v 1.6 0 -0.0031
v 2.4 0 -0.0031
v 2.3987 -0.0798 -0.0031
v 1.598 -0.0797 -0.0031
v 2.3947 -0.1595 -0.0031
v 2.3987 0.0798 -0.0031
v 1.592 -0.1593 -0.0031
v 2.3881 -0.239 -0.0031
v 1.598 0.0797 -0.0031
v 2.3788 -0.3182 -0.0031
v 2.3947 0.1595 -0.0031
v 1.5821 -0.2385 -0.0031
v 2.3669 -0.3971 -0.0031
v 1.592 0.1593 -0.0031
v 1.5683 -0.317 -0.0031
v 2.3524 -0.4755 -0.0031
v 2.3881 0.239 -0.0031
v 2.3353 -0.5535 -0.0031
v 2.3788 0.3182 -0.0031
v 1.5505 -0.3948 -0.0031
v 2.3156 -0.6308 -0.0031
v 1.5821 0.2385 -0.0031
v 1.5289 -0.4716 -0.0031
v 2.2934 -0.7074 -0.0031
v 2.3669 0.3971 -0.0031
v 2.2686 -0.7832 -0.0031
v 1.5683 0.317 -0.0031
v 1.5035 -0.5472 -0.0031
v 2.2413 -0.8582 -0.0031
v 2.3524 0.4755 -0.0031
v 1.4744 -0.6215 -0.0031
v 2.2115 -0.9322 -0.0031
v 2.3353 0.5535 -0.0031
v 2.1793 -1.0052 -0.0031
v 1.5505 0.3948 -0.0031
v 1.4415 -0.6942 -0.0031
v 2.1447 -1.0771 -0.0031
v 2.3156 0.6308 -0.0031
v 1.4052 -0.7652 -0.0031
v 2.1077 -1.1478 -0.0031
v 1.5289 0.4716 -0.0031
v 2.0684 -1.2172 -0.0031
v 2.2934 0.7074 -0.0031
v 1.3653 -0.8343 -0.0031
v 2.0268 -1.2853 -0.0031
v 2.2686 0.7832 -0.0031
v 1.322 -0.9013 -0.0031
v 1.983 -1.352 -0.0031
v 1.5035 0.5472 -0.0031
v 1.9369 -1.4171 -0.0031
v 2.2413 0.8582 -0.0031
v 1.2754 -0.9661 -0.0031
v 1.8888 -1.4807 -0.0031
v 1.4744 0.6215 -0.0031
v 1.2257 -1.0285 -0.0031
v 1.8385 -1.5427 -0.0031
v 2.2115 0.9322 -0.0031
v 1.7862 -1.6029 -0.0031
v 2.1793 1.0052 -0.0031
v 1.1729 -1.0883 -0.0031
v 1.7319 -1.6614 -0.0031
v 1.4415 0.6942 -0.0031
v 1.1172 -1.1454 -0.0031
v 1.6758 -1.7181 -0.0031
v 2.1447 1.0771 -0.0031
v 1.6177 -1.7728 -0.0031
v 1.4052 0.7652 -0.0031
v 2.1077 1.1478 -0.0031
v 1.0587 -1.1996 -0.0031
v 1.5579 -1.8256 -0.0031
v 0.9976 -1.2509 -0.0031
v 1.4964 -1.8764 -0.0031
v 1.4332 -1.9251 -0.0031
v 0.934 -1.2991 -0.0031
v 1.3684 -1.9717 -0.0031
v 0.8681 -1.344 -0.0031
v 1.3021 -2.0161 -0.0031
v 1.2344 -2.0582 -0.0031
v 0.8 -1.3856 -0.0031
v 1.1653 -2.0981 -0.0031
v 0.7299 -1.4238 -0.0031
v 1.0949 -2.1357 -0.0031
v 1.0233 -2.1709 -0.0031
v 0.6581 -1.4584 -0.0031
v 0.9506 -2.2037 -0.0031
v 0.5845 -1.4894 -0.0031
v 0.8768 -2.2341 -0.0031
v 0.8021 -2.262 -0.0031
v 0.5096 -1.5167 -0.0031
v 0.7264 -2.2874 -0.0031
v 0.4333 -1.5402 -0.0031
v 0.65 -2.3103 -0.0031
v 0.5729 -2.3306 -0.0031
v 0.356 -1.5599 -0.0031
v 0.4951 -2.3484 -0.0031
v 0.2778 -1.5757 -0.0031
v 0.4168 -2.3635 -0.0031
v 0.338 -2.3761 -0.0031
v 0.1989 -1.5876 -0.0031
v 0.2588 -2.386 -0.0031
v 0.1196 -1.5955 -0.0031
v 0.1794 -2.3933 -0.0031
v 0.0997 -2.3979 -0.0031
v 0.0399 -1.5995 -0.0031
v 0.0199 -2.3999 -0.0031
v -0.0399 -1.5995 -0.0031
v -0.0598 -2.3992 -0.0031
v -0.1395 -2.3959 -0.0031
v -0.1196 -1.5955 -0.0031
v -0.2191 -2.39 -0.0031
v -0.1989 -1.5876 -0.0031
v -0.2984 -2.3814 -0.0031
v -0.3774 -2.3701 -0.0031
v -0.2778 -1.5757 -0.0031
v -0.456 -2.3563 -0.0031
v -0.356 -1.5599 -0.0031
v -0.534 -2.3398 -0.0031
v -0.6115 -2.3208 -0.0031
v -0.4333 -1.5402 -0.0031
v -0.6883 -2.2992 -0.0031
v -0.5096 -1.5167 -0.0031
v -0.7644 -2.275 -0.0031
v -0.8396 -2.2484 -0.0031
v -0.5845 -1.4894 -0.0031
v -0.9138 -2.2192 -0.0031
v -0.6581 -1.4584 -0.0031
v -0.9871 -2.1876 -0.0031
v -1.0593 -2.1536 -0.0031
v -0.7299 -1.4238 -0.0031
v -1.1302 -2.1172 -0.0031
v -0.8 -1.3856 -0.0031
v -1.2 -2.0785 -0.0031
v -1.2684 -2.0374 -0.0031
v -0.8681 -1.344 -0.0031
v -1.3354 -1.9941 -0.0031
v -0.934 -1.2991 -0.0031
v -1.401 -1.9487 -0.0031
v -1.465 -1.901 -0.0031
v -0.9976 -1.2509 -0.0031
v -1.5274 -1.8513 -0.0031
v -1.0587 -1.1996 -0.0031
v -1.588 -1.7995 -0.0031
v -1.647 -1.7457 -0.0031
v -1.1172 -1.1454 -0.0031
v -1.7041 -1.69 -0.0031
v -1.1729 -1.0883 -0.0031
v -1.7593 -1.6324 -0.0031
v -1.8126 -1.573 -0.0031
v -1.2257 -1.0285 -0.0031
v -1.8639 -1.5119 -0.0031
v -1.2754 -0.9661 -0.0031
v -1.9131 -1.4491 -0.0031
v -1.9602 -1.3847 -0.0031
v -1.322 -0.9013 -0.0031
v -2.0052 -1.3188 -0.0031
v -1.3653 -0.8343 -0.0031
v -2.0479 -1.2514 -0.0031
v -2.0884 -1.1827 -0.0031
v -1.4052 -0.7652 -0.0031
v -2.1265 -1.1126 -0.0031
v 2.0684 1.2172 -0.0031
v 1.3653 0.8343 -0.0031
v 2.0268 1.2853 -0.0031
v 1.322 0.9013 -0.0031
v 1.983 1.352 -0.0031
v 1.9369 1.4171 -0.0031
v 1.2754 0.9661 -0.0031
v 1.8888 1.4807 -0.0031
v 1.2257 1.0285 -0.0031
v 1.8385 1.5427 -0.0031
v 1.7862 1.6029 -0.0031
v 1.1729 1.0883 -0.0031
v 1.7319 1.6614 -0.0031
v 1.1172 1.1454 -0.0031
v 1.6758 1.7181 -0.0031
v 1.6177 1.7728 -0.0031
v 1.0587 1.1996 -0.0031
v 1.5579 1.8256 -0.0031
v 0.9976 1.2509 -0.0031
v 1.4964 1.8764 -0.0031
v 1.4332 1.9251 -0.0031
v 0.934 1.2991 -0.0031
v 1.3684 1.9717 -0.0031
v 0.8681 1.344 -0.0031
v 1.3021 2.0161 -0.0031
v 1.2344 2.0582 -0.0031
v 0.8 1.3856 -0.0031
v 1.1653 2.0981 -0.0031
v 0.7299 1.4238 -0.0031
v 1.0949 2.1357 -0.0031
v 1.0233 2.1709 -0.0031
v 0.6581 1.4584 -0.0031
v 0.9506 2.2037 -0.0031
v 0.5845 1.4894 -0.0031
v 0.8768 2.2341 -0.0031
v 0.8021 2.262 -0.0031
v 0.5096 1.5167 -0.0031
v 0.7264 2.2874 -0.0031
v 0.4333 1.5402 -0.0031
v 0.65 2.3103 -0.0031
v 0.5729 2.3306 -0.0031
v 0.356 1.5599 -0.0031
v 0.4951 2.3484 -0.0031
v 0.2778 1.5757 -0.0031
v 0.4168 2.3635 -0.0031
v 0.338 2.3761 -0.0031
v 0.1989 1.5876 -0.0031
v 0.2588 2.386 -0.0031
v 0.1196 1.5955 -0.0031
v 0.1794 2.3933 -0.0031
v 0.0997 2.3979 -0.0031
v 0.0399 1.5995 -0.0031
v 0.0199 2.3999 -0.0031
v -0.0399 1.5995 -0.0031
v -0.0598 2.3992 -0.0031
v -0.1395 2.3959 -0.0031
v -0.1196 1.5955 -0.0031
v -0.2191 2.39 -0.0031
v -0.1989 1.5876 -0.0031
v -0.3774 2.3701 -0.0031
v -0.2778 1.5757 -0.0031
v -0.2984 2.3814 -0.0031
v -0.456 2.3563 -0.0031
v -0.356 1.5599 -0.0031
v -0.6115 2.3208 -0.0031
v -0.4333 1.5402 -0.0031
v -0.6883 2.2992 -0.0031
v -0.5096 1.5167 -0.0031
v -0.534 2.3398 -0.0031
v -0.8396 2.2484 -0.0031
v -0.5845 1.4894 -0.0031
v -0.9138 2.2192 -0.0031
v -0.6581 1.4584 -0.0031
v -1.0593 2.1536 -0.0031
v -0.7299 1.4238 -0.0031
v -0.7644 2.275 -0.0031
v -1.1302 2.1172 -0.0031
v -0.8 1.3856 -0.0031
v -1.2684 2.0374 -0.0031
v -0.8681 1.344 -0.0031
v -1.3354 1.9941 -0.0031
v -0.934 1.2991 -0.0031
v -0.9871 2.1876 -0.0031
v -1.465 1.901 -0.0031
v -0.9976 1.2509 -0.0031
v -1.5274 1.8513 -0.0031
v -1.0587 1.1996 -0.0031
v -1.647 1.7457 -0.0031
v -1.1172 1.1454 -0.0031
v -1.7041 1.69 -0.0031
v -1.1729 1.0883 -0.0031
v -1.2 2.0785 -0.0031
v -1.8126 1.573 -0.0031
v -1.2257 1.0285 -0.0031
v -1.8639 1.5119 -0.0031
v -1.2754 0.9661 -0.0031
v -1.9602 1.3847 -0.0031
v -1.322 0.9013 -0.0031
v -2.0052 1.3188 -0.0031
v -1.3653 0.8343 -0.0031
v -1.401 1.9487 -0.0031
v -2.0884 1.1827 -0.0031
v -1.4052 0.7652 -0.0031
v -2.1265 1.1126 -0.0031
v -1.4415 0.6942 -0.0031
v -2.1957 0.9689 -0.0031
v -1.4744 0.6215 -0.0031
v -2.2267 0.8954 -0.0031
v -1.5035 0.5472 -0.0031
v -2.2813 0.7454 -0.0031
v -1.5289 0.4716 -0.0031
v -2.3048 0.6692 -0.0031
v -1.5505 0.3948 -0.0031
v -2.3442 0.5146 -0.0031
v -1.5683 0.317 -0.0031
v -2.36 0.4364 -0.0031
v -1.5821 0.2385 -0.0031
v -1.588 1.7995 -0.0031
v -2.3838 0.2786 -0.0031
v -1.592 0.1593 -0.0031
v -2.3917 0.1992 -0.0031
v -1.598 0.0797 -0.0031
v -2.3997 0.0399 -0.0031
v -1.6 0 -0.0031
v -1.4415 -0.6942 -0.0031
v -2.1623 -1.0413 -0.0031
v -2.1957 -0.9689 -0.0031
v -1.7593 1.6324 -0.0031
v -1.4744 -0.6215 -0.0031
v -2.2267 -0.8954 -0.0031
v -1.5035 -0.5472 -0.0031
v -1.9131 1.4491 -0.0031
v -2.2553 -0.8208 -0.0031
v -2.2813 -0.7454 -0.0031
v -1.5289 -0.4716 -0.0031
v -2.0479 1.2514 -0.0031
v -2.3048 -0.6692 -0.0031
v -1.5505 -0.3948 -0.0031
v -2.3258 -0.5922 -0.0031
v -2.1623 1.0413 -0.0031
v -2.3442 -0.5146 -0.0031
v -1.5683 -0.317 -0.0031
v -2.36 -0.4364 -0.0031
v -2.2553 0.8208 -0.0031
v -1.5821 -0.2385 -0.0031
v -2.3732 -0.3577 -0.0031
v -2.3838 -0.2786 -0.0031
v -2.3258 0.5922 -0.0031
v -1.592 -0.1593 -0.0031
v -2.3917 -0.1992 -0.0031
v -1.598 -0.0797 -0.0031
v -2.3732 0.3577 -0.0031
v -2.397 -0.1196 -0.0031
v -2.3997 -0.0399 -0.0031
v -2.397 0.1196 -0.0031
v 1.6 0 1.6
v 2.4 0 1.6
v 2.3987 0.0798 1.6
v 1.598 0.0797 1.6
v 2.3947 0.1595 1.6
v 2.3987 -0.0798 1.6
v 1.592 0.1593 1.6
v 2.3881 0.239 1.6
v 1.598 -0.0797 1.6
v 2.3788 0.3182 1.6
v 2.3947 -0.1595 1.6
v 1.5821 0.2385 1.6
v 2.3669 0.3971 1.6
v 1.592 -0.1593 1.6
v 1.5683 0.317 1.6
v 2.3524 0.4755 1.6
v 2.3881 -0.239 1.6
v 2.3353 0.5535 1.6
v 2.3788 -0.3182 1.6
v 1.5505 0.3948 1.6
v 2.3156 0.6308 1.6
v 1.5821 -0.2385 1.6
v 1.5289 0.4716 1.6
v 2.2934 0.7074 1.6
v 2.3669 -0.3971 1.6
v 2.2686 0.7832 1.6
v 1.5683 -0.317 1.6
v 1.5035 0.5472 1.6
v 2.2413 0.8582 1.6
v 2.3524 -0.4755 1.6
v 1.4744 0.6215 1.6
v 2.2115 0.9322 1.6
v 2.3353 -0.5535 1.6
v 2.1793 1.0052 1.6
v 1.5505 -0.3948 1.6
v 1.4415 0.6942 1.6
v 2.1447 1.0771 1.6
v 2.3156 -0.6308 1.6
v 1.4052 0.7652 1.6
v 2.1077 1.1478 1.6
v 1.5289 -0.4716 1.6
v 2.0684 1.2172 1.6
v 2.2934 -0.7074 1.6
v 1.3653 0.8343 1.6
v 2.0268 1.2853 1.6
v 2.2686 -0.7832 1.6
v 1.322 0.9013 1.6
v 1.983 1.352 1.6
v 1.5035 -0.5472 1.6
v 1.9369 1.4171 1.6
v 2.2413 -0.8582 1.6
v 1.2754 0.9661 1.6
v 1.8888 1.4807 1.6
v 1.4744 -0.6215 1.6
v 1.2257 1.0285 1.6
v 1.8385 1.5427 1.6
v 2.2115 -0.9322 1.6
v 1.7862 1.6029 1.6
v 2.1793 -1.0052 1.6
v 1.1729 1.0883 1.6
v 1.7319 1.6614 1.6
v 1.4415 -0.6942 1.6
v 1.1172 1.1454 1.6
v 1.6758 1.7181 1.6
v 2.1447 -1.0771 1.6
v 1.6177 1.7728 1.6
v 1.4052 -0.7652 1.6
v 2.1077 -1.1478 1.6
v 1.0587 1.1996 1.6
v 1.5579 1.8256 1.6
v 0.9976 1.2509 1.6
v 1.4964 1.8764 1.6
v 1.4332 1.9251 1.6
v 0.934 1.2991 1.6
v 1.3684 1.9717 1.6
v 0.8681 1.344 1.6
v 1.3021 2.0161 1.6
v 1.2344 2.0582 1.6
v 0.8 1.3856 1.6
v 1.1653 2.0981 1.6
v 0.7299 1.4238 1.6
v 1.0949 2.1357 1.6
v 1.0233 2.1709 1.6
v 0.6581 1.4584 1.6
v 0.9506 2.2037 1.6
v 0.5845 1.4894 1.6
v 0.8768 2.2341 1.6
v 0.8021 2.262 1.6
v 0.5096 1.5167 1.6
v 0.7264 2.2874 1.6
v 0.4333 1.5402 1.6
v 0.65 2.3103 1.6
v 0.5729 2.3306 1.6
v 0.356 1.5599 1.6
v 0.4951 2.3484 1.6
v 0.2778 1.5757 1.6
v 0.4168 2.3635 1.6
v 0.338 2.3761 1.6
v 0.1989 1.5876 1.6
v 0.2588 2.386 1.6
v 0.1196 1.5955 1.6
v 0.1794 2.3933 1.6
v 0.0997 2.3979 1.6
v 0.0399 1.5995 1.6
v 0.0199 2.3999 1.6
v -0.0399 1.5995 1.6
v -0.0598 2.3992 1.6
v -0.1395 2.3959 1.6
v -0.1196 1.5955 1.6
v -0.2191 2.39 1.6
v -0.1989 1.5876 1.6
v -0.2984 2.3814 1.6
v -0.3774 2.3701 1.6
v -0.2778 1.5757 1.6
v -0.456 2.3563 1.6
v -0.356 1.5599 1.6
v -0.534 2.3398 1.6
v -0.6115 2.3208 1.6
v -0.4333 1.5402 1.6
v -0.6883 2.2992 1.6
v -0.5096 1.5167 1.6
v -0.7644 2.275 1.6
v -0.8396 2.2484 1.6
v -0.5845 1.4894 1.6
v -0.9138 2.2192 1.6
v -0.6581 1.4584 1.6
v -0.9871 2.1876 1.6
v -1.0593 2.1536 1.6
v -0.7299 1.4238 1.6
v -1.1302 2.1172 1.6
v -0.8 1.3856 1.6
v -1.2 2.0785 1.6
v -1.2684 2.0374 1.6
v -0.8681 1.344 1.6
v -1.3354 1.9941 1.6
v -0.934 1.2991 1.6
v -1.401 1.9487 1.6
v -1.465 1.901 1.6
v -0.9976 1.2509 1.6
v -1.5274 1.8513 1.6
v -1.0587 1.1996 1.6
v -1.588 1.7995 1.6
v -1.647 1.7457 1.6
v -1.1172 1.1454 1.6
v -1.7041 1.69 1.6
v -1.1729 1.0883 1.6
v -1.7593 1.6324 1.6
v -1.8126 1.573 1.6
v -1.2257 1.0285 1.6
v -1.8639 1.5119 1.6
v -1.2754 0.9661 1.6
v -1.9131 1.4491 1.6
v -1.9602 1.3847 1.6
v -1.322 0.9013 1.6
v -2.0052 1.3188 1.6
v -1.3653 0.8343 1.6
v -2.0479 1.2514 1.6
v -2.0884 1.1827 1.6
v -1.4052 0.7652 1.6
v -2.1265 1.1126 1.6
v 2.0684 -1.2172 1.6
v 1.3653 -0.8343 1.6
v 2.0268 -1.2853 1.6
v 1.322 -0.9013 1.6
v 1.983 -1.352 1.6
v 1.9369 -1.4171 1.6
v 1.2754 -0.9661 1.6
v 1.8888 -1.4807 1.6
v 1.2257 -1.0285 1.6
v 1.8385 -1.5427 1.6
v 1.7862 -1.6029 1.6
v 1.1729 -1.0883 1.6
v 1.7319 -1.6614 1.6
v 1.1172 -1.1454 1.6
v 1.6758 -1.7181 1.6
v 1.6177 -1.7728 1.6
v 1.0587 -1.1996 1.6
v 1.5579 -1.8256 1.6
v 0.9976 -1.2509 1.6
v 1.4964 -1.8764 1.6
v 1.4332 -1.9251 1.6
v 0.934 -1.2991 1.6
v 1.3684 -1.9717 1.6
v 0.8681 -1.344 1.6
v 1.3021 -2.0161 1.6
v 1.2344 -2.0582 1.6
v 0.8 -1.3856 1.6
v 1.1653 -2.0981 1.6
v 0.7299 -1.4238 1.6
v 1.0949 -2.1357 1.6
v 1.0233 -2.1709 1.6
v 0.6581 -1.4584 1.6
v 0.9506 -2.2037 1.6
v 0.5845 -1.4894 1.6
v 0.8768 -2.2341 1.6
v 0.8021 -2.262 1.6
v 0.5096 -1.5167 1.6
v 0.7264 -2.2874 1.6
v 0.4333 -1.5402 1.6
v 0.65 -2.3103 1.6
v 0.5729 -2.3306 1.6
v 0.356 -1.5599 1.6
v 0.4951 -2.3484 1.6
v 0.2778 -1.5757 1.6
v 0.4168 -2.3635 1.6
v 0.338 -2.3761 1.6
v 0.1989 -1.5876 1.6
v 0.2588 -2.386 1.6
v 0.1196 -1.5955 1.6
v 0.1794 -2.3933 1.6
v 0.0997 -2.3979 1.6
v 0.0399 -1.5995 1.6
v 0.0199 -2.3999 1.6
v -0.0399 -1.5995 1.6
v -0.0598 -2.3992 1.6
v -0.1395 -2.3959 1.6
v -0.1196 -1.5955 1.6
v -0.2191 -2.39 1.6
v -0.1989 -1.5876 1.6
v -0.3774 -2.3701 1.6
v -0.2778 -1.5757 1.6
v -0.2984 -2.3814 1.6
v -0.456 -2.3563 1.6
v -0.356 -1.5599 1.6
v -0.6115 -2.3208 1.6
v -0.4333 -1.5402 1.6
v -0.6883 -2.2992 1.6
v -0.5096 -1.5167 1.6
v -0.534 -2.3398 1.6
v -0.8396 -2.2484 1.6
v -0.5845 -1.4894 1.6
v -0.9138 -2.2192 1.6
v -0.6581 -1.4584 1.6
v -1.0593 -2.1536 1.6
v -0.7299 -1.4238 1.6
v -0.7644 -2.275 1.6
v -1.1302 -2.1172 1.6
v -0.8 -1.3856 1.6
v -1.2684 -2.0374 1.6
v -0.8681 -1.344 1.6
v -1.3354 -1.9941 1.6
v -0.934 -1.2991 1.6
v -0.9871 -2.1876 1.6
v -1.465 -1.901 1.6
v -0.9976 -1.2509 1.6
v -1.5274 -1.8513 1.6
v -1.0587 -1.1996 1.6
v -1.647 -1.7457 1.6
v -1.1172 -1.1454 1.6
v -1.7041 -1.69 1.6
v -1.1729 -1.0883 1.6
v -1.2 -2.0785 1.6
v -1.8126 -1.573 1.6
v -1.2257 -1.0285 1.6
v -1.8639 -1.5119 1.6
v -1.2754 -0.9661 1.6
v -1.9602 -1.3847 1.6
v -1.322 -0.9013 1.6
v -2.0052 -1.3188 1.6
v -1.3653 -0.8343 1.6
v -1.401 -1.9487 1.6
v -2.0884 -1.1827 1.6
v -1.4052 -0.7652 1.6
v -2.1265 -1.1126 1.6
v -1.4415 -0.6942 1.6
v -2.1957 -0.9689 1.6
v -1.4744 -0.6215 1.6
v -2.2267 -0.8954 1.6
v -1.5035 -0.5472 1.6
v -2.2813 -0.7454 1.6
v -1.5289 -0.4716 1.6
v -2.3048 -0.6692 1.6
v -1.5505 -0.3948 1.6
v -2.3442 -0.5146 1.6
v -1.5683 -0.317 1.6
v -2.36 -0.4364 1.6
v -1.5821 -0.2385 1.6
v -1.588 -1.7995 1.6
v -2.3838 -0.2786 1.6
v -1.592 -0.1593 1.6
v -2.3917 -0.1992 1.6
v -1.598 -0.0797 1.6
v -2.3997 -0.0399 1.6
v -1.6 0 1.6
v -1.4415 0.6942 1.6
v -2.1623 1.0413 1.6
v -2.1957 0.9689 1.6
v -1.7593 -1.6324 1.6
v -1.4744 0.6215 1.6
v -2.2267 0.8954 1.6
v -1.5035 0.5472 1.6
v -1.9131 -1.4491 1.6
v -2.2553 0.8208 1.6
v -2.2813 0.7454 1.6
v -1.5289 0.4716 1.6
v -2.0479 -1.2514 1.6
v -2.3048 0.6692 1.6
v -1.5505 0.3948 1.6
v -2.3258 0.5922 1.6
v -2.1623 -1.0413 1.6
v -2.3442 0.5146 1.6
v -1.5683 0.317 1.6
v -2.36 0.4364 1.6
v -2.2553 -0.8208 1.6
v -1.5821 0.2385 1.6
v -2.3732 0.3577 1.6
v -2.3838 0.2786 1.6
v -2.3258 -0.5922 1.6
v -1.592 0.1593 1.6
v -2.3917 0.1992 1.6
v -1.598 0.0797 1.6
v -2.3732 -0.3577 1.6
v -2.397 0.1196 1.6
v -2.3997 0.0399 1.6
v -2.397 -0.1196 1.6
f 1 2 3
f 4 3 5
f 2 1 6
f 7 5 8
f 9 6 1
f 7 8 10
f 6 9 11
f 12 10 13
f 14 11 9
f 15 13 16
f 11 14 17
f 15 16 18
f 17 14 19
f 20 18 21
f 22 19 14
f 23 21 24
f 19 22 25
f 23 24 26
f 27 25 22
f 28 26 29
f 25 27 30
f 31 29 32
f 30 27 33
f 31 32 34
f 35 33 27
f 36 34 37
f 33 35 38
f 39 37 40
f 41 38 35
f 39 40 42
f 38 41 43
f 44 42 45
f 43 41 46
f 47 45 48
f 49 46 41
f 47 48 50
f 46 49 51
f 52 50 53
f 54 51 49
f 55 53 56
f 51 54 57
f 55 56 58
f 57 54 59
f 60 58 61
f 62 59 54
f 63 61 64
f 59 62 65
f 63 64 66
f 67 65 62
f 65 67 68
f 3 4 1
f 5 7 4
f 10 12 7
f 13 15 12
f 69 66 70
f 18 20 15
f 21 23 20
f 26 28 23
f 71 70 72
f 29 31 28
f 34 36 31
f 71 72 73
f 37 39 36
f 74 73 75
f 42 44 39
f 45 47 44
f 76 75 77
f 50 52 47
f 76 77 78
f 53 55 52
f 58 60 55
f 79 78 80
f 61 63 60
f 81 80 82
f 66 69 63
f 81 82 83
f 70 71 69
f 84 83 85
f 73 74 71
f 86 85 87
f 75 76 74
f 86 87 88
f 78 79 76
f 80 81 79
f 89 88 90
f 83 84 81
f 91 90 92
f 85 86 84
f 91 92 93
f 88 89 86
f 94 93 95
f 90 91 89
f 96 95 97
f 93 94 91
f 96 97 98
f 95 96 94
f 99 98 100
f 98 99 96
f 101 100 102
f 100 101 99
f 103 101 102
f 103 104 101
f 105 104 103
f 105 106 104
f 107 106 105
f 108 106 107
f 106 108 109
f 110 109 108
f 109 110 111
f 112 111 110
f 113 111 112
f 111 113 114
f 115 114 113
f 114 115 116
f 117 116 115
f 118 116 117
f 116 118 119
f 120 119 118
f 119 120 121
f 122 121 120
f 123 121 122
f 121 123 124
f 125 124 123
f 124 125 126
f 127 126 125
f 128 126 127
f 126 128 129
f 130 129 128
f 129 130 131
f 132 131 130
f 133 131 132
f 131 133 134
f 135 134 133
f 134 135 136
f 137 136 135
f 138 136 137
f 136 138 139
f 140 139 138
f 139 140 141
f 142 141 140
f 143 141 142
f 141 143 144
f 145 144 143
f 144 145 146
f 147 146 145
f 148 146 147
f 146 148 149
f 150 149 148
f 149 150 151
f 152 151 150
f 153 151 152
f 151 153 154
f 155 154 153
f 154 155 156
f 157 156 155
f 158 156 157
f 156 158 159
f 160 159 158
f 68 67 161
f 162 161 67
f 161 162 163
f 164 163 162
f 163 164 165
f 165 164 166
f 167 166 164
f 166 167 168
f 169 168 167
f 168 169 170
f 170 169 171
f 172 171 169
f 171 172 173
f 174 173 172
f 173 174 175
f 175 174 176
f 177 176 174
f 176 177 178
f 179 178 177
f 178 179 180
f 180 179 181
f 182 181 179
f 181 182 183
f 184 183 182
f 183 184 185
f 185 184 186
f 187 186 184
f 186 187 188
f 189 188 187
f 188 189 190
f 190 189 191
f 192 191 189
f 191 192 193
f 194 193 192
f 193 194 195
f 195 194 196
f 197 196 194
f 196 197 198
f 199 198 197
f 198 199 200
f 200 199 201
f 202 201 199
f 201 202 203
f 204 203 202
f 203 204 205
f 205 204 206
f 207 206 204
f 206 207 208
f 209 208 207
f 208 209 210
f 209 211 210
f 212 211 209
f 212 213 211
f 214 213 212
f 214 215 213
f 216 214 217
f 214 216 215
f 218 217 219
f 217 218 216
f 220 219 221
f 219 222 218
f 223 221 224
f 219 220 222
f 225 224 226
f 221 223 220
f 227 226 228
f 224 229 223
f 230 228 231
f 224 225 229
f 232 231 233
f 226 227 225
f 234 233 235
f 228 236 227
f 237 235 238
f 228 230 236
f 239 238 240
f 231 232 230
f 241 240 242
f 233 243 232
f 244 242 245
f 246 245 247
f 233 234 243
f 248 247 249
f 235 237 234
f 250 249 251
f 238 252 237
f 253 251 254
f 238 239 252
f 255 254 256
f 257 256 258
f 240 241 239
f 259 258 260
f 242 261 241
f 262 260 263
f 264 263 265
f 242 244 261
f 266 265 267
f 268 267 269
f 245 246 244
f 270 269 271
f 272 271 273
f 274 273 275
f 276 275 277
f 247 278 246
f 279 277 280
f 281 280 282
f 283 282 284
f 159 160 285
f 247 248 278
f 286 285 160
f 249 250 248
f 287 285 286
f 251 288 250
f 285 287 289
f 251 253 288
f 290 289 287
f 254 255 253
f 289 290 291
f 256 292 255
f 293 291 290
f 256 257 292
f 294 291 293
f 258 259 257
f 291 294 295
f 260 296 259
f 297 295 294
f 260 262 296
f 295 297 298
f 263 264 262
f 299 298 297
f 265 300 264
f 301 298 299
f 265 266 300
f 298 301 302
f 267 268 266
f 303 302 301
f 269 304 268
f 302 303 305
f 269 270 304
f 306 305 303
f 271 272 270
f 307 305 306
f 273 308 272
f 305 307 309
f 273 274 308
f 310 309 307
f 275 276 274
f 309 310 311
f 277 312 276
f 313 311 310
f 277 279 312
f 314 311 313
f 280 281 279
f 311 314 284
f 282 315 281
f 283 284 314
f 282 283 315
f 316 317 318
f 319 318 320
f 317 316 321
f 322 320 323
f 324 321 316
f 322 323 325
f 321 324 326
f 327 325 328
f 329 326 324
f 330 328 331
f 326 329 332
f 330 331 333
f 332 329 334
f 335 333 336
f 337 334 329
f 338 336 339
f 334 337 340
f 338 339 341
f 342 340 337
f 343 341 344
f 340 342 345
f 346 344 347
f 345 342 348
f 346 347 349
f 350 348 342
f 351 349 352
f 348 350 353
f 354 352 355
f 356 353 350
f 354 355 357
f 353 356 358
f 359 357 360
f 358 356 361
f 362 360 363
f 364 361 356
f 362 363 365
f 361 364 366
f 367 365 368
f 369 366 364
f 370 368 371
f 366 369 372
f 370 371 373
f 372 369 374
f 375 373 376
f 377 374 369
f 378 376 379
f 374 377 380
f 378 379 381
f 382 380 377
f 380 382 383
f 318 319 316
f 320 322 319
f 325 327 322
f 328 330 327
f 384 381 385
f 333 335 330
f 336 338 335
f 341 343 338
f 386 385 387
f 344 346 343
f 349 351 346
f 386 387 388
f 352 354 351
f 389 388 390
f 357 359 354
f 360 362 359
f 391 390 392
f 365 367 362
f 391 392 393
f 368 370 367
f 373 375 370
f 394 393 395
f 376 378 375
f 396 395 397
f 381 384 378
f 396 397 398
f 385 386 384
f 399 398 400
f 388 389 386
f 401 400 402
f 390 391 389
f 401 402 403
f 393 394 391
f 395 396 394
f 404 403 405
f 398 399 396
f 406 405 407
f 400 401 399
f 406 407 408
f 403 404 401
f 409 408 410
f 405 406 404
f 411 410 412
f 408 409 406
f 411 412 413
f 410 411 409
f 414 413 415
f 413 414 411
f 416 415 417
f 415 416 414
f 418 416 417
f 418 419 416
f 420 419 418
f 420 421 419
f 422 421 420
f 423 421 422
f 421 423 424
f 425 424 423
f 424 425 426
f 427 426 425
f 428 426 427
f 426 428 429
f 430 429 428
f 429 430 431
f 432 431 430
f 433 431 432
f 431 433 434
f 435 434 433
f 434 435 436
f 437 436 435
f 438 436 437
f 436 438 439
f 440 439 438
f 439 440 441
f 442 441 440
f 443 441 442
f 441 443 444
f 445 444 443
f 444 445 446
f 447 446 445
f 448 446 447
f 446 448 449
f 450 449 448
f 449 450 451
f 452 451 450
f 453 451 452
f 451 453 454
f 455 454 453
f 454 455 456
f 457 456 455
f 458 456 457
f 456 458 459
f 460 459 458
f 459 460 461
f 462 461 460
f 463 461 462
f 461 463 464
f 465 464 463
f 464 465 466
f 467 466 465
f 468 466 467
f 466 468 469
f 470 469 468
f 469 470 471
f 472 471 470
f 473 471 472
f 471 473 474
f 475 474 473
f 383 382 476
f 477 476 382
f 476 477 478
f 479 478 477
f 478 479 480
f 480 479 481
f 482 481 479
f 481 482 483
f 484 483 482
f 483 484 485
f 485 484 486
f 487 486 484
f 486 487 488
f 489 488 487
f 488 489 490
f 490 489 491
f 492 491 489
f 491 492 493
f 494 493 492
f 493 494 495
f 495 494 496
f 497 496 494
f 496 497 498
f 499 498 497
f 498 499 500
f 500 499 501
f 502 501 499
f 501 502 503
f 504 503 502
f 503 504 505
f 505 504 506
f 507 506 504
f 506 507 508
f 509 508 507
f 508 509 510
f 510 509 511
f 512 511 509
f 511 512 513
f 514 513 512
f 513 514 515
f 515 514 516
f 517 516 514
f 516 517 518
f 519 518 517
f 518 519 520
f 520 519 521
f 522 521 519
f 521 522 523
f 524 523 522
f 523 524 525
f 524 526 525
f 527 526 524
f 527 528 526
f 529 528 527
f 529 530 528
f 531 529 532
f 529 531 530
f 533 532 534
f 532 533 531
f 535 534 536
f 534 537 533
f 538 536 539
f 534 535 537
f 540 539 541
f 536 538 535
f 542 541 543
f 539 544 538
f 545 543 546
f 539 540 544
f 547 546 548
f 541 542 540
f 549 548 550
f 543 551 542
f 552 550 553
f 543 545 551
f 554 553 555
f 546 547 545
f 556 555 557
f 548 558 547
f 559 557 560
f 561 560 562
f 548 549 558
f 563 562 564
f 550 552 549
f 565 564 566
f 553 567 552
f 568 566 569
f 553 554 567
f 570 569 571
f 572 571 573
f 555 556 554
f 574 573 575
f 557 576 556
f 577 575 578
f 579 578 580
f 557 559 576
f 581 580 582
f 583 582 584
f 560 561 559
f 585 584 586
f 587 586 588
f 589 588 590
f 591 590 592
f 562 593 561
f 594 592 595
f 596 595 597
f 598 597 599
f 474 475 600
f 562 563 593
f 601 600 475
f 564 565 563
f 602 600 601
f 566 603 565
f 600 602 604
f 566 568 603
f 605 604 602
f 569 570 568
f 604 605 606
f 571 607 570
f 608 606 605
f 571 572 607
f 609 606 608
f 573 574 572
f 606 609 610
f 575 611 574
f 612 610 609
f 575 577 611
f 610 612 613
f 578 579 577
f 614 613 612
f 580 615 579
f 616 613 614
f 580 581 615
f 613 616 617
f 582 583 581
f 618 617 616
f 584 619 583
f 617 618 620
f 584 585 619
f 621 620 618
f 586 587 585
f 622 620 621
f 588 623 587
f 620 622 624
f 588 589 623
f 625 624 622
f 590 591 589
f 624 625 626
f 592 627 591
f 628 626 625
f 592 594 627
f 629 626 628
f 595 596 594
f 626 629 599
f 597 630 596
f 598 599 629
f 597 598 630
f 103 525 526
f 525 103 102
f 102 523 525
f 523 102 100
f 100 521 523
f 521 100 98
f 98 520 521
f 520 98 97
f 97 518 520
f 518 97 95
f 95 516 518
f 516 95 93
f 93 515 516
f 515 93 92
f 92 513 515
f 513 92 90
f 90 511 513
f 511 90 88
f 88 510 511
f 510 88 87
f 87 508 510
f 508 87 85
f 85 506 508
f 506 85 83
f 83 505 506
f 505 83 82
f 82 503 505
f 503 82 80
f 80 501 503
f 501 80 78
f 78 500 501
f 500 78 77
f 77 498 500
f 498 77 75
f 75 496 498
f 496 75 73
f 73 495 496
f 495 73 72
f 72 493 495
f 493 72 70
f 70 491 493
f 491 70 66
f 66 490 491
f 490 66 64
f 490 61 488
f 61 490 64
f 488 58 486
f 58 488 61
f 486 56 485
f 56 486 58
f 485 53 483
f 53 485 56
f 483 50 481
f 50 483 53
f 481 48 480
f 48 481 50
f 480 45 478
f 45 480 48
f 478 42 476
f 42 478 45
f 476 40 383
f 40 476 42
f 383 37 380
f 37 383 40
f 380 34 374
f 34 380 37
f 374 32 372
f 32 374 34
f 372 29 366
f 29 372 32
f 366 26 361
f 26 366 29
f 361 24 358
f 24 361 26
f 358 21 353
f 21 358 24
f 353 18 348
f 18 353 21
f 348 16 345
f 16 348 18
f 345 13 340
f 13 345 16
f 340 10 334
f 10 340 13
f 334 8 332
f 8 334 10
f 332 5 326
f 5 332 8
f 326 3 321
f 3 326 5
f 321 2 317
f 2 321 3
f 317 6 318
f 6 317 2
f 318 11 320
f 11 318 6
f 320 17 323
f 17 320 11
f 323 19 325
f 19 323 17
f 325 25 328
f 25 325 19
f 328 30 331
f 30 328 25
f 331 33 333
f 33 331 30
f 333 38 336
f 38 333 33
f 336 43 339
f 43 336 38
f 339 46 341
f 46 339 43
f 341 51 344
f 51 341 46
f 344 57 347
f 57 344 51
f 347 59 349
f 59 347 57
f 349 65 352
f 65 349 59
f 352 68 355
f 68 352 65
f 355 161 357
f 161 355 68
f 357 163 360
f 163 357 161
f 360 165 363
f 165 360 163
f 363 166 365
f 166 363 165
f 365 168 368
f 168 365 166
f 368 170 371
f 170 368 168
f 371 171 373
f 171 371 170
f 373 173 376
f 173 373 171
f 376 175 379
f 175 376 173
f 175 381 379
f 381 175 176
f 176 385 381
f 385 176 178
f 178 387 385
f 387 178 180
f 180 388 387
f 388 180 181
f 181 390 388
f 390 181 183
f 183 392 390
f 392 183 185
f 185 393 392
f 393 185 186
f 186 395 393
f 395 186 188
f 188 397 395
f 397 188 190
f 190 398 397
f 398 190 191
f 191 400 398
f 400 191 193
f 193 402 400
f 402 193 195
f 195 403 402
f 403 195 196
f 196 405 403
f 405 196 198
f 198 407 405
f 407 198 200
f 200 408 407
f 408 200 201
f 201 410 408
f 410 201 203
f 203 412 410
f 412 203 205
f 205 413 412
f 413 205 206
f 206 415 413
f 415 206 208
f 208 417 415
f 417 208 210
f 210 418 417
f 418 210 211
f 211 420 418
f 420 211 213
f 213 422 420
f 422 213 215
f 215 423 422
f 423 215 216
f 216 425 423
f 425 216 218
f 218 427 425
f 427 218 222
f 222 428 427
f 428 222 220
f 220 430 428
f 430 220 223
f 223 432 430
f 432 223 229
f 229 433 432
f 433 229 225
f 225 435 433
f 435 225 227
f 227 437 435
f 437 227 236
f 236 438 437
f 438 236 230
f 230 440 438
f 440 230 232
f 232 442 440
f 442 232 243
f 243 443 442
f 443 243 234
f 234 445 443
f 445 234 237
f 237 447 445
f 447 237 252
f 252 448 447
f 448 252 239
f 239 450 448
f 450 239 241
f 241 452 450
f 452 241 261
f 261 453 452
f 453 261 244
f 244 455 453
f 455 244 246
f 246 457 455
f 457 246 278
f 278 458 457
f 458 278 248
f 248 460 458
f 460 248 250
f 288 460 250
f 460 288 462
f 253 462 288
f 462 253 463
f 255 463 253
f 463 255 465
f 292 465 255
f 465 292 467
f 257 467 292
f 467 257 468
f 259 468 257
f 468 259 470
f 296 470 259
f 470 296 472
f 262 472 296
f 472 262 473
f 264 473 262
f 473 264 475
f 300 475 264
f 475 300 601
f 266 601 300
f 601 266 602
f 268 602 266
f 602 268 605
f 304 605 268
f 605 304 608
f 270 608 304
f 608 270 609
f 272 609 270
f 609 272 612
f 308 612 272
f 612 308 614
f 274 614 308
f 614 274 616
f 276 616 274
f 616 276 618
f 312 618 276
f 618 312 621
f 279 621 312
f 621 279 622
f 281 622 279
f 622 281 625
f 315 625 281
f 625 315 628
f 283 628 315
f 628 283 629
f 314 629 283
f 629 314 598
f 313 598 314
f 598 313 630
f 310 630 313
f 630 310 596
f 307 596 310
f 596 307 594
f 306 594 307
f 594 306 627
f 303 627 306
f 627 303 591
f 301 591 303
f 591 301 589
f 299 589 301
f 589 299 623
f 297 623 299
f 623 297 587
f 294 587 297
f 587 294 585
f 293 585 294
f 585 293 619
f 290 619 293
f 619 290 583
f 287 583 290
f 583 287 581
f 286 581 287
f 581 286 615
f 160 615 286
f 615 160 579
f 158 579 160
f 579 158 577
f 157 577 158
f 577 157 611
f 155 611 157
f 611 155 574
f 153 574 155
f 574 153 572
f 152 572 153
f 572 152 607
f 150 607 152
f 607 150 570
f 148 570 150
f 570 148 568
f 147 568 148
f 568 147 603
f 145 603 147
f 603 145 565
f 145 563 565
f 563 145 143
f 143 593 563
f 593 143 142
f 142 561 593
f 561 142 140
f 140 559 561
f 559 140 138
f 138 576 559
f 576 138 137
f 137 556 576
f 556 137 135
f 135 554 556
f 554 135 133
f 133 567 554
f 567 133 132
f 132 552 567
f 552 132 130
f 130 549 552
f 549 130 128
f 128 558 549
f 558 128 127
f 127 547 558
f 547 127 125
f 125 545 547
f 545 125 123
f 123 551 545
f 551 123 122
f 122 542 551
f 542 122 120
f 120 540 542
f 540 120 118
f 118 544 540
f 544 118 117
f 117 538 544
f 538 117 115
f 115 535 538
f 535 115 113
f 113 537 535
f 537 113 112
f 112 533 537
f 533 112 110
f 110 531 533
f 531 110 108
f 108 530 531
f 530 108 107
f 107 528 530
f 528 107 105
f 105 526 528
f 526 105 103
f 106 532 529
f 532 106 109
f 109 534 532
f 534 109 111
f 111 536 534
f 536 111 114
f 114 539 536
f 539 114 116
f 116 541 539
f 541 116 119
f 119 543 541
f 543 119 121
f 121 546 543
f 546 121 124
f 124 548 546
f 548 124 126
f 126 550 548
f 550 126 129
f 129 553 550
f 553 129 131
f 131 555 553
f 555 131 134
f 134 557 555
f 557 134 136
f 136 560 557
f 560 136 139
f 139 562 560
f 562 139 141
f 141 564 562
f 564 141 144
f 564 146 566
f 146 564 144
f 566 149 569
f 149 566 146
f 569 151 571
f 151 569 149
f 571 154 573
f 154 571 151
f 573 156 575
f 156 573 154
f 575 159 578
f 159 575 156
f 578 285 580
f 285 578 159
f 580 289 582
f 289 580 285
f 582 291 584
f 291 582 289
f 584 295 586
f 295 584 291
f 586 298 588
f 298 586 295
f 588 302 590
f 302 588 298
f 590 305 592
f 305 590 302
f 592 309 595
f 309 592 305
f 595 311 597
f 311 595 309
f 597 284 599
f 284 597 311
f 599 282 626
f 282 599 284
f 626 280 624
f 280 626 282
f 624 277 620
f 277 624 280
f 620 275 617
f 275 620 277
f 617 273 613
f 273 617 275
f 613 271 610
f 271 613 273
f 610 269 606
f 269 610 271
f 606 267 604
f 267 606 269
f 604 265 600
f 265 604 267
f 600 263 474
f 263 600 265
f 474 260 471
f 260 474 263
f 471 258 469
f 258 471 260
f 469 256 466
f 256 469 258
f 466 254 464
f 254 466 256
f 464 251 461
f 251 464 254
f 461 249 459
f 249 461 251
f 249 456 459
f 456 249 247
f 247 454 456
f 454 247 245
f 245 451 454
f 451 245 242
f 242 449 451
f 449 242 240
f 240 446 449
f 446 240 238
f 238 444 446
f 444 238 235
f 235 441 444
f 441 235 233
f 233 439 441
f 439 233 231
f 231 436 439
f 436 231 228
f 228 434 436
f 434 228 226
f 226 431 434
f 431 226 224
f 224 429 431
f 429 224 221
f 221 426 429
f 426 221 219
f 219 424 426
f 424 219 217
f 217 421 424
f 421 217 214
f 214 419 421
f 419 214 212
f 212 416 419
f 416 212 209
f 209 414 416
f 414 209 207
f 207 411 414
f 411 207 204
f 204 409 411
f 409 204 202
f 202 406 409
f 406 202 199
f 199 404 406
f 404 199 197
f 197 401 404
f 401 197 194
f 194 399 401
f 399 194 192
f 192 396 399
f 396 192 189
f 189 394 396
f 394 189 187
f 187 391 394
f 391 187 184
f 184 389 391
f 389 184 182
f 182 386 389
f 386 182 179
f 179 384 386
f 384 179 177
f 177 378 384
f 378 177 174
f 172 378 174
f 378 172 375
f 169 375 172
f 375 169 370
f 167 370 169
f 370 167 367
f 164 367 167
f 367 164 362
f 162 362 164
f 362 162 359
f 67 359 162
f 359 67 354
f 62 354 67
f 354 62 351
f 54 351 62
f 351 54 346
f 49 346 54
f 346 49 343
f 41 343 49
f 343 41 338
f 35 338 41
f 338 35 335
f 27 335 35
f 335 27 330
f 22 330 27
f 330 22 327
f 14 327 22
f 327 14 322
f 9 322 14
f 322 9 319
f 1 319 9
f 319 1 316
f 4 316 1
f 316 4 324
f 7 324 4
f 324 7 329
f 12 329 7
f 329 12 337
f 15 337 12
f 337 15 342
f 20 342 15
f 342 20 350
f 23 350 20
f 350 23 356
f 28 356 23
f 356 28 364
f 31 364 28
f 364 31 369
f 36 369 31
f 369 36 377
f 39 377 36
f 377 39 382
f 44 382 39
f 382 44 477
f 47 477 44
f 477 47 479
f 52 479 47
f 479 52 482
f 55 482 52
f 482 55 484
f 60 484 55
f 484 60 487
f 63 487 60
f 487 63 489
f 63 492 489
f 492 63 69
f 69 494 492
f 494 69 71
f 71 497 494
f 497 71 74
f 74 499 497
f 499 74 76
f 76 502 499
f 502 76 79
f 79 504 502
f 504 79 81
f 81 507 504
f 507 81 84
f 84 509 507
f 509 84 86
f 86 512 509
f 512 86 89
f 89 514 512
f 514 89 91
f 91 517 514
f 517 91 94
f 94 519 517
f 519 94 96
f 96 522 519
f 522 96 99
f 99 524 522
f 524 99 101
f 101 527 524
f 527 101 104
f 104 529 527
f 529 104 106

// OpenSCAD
use <../lib.scad>
use <../p/box4t.scad>
use <../p/box5.scad>
use <../p/clip5.scad>
use <../p/stud2.scad>
$fa=1; $fs=0.2;
function ldraw_lib__60475b(realsolid=false) = [
// 0 Brick  1 x  1 with Clip Vertical (Thick C-Clip) and Hollow Stud
// 0 Name: 60475b.dat
// 0 Author: Owen Burgoyne [C3POwen]
// 0 !LDRAW_ORG Part UPDATE 2013-02
// 0 !LICENSE Licensed under CC BY 2.0 and CC BY 4.0 : see CAreadme.txt
// 
// 0 BFC CERTIFY CCW
  [0,"BFC","CERTIFY"],
  [0,"BFC","CCW"],
// 
// 0 !HISTORY 2013-12-23 [PTadmin] Official Update 2013-02
// 
// 
// 4 16 -10 24 10 10 24 10 6 24 6 -6 24 6
  [4,16,-10,24,10,10,24,10,6,24,6,-6,24,6],
// 4 16 10 24 10 10 24 -10 6 24 -6 6 24 6
  [4,16,10,24,10,10,24,-10,6,24,-6,6,24,6],
// 4 16 10 24 -10 -10 24 -10 -6 24 -6 6 24 -6
  [4,16,10,24,-10,-10,24,-10,-6,24,-6,6,24,-6],
// 4 16 -10 24 -10 -10 24 10 -6 24 6 -6 24 -6
  [4,16,-10,24,-10,-10,24,10,-6,24,6,-6,24,-6],
// 0 BFC INVERTNEXT
  [0,"BFC","INVERTNEXT"],
// 1 16 0 24 0 6 0 0 0 -20 0 0 0 6 box5.dat
  [1,16,0,24,0,6,0,0,0,-20,0,0,0,6, ldraw_lib__box5(realsolid)],
// 1 16 0 24 0 10 0 0 0 -24 0 0 0 10 box4t.dat
  [1,16,0,24,0,10,0,0,0,-24,0,0,0,10, ldraw_lib__box4t(realsolid)],
// 4 16 10 24 -10 4.19094 16 -10 -4.19094 16 -10 -10 24 -10
  [4,16,10,24,-10,4.19094,16,-10,-4.19094,16,-10,-10,24,-10],
// 4 16 -10 24 -10 -4.19094 16 -10 -4.19094 8 -10 -10 0 -10
  [4,16,-10,24,-10,-4.19094,16,-10,-4.19094,8,-10,-10,0,-10],
// 4 16 -10 0 -10 -4.19094 8 -10 4.19094 8 -10 10 0 -10
  [4,16,-10,0,-10,-4.19094,8,-10,4.19094,8,-10,10,0,-10],
// 4 16 10 0 -10 4.19094 8 -10 4.19094 16 -10 10 24 -10
  [4,16,10,0,-10,4.19094,8,-10,4.19094,16,-10,10,24,-10],
// 2 24 4.19094 16 -10 -4.19094 16 -10
  [2,24,4.19094,16,-10,-4.19094,16,-10],
// 2 24 -4.19094 16 -10 -4.19094 8 -10
  [2,24,-4.19094,16,-10,-4.19094,8,-10],
// 2 24 4.19094 8 -10 -4.19094 8 -10
  [2,24,4.19094,8,-10,-4.19094,8,-10],
// 2 24 4.19094 16 -10 4.19094 8 -10
  [2,24,4.19094,16,-10,4.19094,8,-10],
// 1 16 0 12 -20 1 0 0 0 1 0 0 0 1 clip5.dat
  [1,16,0,12,-20,1,0,0,0,1,0,0,0,1, ldraw_lib__clip5(realsolid)],
// 1 16 0 0 0 0 0 -1 0 1 0 1 0 0 stud2.dat
  [1,16,0,0,0,0,0,-1,0,1,0,1,0,0, ldraw_lib__stud2(realsolid)],
];
module ldraw_lib__60475b(step=0, col=false, unit=2/5, alt=false, line=0.2, solid=!$preview)
    makepoly(ldraw_lib__60475b(solid), step=step, col=col, unit=unit, alt=alt, line=line, solid=solid);
ldraw_lib__60475b(line=0.2);
